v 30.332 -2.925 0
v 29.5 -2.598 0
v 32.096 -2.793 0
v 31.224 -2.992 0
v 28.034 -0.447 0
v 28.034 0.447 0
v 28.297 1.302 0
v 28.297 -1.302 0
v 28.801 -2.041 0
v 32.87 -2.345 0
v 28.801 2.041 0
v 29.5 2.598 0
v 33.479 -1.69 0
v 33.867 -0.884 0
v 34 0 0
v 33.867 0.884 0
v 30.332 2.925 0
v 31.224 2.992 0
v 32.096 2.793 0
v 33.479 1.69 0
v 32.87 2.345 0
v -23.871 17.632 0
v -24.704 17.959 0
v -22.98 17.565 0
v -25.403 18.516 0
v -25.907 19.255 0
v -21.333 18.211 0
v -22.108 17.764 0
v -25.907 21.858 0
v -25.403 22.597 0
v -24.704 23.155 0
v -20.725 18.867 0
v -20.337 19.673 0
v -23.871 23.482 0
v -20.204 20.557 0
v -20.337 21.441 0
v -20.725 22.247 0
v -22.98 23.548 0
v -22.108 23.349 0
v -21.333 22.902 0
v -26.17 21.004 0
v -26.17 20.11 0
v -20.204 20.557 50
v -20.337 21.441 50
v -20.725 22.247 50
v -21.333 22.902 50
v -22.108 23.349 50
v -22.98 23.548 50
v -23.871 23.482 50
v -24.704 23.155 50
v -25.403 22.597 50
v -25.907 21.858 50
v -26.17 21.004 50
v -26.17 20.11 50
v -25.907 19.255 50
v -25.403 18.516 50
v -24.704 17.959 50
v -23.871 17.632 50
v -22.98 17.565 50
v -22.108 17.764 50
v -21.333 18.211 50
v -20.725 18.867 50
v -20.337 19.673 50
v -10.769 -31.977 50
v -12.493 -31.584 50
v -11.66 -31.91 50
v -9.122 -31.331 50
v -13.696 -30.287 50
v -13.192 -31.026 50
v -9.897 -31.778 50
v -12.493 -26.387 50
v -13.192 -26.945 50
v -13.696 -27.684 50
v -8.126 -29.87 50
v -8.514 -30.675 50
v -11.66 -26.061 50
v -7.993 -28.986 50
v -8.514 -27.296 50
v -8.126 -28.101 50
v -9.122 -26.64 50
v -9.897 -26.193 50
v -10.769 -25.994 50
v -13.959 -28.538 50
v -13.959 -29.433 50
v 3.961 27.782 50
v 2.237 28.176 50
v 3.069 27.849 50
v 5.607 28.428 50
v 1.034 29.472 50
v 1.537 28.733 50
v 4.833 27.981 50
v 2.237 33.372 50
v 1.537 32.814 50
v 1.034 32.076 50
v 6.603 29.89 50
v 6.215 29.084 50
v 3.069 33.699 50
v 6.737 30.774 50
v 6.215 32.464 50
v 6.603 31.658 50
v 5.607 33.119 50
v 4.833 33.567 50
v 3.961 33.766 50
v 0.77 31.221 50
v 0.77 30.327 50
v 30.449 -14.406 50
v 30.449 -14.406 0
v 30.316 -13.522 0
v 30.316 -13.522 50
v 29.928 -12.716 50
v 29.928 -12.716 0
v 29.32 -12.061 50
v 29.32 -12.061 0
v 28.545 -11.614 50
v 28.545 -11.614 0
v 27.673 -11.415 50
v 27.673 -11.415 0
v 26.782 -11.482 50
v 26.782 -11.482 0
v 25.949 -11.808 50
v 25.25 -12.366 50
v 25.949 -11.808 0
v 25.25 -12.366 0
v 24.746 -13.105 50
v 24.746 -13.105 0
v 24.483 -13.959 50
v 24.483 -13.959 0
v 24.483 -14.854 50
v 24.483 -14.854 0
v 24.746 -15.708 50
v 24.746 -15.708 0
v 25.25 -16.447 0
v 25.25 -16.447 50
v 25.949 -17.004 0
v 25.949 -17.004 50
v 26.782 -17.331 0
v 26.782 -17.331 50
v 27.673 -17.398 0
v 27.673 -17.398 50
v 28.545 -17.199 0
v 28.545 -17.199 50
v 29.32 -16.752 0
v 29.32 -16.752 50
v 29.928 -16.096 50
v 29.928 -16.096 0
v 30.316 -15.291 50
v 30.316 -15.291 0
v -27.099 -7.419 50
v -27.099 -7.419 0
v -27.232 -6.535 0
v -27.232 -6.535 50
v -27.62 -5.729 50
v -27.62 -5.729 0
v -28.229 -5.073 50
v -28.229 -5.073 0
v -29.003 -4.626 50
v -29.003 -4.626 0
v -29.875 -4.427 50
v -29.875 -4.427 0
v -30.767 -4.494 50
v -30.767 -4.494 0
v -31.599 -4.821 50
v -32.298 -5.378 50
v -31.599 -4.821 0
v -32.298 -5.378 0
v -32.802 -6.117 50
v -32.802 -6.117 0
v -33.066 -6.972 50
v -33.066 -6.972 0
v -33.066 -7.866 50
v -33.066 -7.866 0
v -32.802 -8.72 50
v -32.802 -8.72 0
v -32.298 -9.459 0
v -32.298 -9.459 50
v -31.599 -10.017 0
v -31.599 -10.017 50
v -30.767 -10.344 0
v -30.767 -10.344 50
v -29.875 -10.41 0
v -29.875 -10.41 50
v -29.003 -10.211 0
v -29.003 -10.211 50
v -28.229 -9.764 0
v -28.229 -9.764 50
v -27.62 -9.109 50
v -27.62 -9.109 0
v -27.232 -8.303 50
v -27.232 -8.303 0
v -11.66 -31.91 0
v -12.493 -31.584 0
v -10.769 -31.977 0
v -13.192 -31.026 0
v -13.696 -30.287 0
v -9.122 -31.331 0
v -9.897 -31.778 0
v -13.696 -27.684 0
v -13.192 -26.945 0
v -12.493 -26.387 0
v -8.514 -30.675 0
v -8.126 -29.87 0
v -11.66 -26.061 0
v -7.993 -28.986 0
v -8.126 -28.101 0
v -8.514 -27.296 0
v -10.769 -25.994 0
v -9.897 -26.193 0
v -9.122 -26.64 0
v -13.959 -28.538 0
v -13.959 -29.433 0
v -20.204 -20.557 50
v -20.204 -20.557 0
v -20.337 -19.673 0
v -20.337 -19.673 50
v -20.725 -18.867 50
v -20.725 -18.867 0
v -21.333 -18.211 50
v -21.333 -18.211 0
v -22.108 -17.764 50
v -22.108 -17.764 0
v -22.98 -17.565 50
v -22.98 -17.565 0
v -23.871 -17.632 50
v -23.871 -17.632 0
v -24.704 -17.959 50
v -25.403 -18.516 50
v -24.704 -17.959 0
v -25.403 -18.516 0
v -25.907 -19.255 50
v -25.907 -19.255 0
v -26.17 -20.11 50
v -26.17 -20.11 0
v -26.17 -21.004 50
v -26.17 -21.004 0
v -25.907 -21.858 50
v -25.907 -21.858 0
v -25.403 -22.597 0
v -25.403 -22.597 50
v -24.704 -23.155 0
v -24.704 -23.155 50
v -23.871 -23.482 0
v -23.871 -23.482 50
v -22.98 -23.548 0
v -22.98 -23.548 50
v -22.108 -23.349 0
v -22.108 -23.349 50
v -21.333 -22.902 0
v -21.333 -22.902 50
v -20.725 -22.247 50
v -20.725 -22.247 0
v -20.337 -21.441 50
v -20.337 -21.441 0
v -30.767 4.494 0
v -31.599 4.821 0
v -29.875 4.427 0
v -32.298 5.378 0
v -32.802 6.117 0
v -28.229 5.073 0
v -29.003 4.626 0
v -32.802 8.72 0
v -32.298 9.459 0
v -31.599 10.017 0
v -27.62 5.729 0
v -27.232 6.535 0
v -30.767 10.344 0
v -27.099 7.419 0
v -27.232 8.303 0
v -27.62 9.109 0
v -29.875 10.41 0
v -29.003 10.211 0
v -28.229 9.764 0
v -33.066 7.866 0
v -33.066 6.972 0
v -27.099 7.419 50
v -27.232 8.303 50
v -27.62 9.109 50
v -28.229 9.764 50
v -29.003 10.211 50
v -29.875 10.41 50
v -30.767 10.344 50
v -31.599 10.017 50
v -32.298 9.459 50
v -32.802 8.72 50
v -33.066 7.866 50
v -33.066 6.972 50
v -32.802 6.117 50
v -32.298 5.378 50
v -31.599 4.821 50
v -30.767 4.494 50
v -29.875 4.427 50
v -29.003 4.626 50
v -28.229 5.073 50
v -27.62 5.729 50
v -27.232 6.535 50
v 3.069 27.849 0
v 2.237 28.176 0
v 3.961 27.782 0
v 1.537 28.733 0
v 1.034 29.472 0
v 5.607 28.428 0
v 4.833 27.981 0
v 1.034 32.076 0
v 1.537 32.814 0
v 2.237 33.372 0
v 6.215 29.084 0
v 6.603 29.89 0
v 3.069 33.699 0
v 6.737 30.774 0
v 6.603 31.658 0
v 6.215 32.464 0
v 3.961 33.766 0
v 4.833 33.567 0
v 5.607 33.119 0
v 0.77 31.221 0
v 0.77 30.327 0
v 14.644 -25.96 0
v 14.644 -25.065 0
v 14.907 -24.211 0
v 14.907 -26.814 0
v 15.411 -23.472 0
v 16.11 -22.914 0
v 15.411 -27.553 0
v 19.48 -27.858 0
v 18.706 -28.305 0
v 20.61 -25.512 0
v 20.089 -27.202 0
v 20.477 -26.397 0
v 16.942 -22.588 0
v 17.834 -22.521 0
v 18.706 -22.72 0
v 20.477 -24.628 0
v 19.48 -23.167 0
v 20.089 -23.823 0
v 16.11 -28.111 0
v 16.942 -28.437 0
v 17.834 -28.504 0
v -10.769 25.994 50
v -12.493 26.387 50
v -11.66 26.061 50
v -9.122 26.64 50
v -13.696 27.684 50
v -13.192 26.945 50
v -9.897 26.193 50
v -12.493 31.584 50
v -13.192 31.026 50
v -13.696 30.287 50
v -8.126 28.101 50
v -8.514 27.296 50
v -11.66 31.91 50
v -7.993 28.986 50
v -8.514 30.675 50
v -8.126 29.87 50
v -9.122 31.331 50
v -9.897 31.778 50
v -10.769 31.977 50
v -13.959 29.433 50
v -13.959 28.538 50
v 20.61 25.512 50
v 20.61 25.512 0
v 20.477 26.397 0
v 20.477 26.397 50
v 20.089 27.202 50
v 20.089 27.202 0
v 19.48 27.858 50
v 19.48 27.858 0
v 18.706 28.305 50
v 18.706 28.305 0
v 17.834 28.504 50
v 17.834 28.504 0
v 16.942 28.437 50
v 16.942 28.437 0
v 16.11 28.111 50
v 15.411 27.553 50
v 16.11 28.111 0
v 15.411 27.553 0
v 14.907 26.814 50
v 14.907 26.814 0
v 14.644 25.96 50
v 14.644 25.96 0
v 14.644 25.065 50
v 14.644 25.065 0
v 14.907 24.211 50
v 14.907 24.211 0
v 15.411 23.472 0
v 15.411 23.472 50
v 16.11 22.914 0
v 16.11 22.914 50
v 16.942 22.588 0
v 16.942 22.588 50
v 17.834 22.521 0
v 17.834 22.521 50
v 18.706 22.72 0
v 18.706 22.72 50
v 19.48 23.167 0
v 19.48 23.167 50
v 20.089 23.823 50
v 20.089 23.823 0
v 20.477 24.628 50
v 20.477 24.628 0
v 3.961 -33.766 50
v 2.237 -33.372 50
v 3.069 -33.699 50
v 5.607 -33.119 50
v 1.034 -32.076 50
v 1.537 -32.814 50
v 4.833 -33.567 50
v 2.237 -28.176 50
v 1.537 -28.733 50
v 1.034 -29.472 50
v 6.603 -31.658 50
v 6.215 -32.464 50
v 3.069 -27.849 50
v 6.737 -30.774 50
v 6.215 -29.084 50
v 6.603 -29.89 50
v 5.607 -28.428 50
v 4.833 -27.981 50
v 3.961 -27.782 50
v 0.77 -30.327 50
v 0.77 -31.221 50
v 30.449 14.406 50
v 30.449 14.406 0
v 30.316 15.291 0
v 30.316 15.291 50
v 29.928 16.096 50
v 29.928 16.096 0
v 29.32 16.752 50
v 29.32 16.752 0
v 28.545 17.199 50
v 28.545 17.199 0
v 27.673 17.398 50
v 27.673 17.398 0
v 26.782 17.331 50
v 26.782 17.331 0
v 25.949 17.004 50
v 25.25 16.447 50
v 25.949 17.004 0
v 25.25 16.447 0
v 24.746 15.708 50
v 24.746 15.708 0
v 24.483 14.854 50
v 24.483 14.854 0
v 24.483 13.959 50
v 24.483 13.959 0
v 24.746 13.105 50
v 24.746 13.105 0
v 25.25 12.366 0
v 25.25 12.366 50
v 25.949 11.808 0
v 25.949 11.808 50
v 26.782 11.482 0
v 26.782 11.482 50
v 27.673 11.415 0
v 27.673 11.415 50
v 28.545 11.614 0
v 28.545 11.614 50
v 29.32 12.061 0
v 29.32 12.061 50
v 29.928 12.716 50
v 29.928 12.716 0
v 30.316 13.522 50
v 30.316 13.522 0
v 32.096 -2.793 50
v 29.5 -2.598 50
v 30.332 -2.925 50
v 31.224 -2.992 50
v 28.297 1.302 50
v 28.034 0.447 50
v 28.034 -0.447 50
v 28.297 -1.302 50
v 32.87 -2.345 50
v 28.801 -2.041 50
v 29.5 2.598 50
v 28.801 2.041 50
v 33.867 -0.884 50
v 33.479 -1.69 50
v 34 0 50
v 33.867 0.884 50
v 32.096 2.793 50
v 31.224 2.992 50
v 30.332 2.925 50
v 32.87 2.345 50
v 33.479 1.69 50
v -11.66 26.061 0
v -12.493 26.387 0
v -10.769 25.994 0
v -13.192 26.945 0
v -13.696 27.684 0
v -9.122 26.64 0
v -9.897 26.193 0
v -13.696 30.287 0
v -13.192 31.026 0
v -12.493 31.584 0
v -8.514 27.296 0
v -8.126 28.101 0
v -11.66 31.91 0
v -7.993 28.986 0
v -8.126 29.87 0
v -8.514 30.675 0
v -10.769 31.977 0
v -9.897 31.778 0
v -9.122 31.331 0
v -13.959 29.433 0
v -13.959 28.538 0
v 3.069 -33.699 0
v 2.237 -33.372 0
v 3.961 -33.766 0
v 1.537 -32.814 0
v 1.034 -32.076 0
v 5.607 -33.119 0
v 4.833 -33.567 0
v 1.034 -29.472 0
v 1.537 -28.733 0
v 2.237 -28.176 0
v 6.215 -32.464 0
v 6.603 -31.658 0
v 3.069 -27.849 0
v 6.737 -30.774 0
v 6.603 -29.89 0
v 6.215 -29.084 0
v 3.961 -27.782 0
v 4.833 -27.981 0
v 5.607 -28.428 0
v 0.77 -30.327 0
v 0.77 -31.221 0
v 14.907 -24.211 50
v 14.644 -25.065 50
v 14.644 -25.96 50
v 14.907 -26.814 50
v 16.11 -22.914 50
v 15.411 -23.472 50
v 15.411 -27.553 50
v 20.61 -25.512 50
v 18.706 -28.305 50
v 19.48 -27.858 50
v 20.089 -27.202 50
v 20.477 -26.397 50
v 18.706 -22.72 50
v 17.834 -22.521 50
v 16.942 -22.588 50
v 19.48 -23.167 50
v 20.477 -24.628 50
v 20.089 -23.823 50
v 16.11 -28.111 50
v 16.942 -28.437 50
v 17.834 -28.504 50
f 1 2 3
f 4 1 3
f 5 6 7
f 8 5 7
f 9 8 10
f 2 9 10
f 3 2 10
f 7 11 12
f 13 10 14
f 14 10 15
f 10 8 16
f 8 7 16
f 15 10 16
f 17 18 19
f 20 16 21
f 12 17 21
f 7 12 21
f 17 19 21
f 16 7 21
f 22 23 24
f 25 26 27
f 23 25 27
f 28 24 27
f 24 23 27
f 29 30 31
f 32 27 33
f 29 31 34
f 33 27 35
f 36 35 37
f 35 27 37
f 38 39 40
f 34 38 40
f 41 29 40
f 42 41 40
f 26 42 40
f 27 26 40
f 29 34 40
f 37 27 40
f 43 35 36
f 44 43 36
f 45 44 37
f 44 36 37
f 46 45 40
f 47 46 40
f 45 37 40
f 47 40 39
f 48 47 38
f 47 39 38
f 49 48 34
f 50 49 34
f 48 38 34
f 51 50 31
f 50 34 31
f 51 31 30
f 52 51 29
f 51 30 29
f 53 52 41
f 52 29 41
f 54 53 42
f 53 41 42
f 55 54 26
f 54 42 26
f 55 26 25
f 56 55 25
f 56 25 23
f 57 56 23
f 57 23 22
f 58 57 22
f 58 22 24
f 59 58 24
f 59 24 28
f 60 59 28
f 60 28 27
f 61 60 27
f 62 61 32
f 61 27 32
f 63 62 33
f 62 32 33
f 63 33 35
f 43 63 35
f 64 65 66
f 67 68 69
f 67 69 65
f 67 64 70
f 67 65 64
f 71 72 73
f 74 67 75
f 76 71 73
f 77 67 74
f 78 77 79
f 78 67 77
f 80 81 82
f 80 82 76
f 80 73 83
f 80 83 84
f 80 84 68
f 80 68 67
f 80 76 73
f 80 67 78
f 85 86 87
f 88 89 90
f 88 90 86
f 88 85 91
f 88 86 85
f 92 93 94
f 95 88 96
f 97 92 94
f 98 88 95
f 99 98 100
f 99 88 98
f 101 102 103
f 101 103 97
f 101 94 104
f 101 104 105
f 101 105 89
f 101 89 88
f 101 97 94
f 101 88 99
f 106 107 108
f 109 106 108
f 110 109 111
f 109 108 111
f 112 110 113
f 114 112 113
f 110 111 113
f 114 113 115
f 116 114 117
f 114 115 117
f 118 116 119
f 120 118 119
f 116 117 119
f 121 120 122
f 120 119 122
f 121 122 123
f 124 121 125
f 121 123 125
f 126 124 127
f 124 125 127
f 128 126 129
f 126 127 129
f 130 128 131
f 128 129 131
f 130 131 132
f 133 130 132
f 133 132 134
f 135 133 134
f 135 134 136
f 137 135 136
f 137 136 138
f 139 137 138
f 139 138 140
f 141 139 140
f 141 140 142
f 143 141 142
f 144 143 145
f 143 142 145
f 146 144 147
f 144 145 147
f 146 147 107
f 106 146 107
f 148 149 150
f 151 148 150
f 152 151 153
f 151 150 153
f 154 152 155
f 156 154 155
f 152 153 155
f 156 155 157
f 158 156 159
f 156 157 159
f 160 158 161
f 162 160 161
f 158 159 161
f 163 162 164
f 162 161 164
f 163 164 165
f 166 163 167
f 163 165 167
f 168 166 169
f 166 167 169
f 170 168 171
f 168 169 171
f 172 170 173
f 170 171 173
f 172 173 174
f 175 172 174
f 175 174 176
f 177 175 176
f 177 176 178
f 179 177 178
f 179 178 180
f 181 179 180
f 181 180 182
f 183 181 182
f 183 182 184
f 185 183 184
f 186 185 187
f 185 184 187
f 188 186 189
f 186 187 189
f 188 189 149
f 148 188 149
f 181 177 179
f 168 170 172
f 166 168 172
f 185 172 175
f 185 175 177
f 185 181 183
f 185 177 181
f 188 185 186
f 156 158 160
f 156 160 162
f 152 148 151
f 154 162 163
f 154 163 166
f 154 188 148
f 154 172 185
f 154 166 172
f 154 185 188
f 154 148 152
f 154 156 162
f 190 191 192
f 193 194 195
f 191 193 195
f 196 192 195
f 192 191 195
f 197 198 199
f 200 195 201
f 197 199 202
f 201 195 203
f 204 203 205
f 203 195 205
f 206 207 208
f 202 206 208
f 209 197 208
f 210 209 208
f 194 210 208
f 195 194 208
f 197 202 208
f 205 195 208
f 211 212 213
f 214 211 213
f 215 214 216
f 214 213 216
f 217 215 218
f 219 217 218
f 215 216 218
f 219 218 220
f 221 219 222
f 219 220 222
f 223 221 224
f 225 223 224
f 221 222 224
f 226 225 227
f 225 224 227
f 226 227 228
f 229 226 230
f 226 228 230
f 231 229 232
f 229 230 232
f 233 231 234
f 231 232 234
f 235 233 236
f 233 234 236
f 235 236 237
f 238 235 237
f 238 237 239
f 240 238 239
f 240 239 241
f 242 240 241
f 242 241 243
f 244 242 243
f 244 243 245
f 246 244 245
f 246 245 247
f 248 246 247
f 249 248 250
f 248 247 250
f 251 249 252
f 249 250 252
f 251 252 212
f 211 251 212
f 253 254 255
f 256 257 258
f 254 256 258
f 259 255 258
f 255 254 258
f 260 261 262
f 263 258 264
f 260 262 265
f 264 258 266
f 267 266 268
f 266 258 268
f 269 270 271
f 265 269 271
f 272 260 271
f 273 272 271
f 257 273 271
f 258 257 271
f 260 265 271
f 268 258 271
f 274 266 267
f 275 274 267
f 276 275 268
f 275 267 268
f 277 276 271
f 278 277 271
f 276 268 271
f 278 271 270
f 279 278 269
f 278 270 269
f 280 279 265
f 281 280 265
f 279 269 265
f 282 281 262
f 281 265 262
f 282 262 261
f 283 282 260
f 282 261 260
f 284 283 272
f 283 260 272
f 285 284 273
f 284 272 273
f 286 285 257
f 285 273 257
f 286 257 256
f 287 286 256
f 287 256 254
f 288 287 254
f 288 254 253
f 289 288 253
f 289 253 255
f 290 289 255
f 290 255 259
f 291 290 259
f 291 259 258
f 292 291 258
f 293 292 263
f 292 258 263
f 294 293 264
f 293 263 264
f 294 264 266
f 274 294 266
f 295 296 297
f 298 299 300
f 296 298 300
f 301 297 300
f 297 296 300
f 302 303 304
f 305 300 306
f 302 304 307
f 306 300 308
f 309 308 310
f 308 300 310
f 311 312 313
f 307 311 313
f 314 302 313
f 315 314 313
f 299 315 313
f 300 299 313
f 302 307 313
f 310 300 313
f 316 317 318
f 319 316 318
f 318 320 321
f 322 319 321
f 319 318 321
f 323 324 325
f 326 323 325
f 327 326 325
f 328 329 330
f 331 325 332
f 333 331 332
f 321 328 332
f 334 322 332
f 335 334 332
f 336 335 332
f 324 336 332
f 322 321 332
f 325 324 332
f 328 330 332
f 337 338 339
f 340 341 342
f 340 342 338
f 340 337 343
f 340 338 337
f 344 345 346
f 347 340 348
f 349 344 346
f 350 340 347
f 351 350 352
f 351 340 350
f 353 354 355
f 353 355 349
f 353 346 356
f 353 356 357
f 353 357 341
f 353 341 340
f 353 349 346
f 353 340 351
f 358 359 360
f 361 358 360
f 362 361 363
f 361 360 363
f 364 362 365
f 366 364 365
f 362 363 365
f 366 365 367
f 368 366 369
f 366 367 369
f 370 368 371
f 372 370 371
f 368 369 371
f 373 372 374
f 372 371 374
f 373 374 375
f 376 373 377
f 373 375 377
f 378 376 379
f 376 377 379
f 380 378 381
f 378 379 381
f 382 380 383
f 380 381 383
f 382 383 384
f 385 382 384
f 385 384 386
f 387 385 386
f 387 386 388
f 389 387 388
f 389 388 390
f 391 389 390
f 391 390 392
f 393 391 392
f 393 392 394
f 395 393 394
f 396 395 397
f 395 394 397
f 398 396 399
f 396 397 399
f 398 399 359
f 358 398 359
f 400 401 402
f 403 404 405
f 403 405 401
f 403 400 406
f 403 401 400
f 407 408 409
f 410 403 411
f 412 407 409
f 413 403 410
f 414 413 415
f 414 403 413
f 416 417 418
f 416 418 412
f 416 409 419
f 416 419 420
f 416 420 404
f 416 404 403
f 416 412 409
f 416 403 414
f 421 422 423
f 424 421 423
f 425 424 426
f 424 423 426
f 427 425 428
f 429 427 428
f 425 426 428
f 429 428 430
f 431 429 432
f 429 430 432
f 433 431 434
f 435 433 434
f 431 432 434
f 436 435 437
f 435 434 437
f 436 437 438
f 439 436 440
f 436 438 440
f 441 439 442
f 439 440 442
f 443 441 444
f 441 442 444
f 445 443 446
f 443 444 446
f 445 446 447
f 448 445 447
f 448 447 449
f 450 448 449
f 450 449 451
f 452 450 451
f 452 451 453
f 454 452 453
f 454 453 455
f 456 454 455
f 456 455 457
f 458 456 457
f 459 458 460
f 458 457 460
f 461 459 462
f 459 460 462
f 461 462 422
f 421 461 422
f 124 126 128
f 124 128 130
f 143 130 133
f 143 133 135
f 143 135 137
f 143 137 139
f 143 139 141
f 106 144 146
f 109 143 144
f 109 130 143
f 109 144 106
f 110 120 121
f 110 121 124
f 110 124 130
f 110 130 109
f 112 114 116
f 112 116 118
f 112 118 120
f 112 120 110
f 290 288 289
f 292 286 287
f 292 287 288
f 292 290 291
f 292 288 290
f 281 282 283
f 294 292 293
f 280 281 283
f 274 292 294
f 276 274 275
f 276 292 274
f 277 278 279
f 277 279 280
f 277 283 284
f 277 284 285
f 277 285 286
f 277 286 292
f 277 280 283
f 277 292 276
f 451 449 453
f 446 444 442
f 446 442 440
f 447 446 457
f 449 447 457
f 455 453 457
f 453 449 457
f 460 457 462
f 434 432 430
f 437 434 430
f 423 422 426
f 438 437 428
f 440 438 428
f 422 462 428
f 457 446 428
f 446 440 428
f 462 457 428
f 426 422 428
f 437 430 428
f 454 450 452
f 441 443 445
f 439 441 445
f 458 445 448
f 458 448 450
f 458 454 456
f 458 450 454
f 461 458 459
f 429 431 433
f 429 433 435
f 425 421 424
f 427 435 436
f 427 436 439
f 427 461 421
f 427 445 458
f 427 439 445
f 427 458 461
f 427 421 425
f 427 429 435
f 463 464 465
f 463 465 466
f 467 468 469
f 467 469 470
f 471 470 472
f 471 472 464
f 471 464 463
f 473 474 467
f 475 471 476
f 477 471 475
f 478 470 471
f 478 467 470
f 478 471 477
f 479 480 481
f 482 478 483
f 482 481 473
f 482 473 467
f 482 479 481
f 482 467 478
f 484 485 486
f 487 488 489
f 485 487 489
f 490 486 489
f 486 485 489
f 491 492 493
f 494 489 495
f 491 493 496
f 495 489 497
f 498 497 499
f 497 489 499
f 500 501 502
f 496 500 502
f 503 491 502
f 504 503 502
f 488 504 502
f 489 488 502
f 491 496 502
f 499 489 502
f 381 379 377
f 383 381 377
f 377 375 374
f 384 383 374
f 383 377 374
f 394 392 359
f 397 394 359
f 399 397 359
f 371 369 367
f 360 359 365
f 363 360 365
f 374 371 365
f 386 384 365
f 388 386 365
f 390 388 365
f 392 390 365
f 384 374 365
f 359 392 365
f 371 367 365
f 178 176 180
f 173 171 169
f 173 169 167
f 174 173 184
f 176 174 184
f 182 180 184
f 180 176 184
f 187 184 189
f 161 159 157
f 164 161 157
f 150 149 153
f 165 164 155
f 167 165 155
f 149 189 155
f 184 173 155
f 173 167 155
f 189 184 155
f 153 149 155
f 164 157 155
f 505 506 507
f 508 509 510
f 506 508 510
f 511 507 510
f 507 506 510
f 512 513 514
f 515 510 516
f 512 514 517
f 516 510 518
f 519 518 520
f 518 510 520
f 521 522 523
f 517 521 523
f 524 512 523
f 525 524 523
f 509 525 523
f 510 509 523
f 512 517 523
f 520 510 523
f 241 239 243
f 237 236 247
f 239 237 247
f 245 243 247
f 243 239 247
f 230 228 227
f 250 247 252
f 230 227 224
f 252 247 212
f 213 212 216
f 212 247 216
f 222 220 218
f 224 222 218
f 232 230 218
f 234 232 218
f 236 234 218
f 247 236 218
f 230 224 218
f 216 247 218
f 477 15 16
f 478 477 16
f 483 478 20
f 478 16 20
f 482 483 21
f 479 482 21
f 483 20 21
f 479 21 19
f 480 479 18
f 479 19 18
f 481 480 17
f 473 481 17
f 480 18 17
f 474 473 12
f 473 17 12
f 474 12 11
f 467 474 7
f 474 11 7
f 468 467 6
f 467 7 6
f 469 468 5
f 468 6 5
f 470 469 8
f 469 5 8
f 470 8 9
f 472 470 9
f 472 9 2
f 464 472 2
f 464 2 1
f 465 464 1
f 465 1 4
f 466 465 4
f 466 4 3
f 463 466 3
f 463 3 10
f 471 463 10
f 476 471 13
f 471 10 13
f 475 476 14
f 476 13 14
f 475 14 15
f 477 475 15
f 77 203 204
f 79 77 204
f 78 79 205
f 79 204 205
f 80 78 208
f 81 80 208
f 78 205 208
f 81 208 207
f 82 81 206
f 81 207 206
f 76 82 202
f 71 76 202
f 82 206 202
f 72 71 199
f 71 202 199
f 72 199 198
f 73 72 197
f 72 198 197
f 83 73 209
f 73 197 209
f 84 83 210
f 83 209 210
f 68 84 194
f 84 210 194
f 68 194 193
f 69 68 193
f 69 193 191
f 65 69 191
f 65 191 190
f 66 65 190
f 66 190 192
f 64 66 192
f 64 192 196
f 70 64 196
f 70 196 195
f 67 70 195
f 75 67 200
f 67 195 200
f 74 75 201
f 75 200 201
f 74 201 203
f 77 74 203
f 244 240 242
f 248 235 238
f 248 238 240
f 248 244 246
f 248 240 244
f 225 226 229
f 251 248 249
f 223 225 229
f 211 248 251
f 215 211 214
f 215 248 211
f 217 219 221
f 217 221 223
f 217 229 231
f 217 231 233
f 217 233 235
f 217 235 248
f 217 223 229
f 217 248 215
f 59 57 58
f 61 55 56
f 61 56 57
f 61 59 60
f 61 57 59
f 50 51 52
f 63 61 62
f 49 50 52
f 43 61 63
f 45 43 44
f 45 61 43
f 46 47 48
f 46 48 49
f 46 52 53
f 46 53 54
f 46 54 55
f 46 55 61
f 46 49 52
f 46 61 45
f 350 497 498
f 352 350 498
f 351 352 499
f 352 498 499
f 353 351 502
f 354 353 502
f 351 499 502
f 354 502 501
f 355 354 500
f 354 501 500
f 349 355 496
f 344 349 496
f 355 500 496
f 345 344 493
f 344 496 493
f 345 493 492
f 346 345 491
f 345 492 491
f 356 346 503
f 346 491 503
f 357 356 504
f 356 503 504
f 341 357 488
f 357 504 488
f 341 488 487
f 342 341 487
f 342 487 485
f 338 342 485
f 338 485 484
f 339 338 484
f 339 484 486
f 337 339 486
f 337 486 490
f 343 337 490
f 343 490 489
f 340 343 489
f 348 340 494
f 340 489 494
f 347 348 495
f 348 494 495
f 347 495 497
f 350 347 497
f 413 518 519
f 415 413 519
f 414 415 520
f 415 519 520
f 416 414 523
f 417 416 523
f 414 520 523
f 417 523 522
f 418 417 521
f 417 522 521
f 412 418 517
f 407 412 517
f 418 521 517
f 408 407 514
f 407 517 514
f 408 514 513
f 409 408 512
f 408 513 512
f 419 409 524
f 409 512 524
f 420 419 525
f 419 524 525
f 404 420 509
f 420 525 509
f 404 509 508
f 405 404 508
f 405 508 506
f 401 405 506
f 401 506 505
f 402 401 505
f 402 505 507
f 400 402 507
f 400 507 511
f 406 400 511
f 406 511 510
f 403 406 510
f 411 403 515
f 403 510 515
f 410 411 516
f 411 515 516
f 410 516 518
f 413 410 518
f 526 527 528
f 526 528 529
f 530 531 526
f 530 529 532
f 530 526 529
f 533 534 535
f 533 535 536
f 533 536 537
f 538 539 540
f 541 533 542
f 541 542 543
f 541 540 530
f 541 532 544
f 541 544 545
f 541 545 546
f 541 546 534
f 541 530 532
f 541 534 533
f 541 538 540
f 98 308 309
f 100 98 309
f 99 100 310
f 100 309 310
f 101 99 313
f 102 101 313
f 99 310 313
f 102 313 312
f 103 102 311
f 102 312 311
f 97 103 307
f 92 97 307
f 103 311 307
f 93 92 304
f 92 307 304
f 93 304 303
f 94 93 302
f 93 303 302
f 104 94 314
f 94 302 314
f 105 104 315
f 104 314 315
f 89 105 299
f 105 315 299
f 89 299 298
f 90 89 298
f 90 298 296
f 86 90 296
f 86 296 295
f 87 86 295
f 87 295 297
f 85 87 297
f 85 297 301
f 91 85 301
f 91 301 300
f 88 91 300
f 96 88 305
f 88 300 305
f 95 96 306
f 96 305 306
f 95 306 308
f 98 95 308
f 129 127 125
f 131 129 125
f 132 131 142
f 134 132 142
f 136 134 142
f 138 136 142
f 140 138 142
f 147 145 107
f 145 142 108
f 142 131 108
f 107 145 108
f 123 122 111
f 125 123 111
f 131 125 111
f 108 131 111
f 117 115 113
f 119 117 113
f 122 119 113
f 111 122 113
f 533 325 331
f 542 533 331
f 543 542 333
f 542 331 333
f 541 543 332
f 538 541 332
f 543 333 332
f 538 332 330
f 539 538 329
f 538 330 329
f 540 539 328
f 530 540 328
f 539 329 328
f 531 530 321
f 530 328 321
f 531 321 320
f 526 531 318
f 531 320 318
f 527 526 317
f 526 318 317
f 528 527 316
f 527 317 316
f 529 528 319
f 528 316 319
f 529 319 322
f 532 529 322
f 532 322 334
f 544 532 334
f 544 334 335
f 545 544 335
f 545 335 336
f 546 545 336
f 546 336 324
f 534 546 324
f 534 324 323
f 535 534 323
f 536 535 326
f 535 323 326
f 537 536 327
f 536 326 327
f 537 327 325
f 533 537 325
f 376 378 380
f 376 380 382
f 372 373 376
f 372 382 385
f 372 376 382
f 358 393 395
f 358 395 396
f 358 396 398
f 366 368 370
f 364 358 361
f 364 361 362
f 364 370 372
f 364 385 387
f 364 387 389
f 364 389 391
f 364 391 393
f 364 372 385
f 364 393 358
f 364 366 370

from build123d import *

# Parameters (mm, degrees)
SKETCH1_R              = 3
BOSS_EXTRUDE1_DEPTH    = 50
BOSS_EXTRUDE1_2_DEPTH  = 50
BOSS_EXTRUDE1_3_DEPTH  = 50
BOSS_EXTRUDE1_4_DEPTH  = 50
BOSS_EXTRUDE1_5_DEPTH  = 50
BOSS_EXTRUDE1_6_DEPTH  = 50
BOSS_EXTRUDE1_7_DEPTH  = 50
BOSS_EXTRUDE1_8_DEPTH  = 50
BOSS_EXTRUDE1_9_DEPTH  = 50
BOSS_EXTRUDE1_10_DEPTH = 50
BOSS_EXTRUDE1_11_DEPTH = 50
BOSS_EXTRUDE1_12_DEPTH = 50
BOSS_EXTRUDE1_13_DEPTH = 50


with BuildPart() as part:
    # Sketch1 → Boss-Extrude1 (new body)
    with BuildSketch(Plane.XY):
        with Locations((31, 0)):
            Circle(SKETCH1_R)
    extrude(amount=BOSS_EXTRUDE1_DEPTH)


with BuildPart() as body_2:
    # Sketch1 → Boss-Extrude1 2 (new body)
    with BuildSketch(Plane.XY):
        with Locations((27.449136795, -14.406418333)):
            Circle(SKETCH1_R)
    extrude(amount=BOSS_EXTRUDE1_2_DEPTH)


with BuildPart() as body_3:
    # Sketch1 → Boss-Extrude1 3 (new body)
    with BuildSketch(Plane.XY):
        with Locations((17.610007149, -25.512499843)):
            Circle(SKETCH1_R)
    extrude(amount=BOSS_EXTRUDE1_3_DEPTH)


with BuildPart() as body_4:
    # Sketch1 → Boss-Extrude1 4 (new body)
    with BuildSketch(Plane.XY):
        with Locations((3.736637088, -30.773975097)):
            Circle(SKETCH1_R)
    extrude(amount=BOSS_EXTRUDE1_4_DEPTH)


with BuildPart() as body_5:
    # Sketch1 → Boss-Extrude1 5 (new body)
    with BuildSketch(Plane.XY):
        with Locations((-10.992751498, -28.985503523)):
            Circle(SKETCH1_R)
    extrude(amount=BOSS_EXTRUDE1_5_DEPTH)


with BuildPart() as body_6:
    # Sketch1 → Boss-Extrude1 6 (new body)
    with BuildSketch(Plane.XY):
        with Locations((-23.203833193, -20.556802405)):
            Circle(SKETCH1_R)
    extrude(amount=BOSS_EXTRUDE1_6_DEPTH)


with BuildPart() as body_7:
    # Sketch1 → Boss-Extrude1 7 (new body)
    with BuildSketch(Plane.XY):
        with Locations((-30.09919634, -7.418785593)):
            Circle(SKETCH1_R)
    extrude(amount=BOSS_EXTRUDE1_7_DEPTH)


with BuildPart() as body_8:
    # Sketch1 → Boss-Extrude1 8 (new body)
    with BuildSketch(Plane.XY):
        with Locations((-30.09919634, 7.418785593)):
            Circle(SKETCH1_R)
    extrude(amount=BOSS_EXTRUDE1_8_DEPTH)


with BuildPart() as body_9:
    # Sketch1 → Boss-Extrude1 9 (new body)
    with BuildSketch(Plane.XY):
        with Locations((-23.203833193, 20.556802405)):
            Circle(SKETCH1_R)
    extrude(amount=BOSS_EXTRUDE1_9_DEPTH)


with BuildPart() as body_10:
    # Sketch1 → Boss-Extrude1 10 (new body)
    with BuildSketch(Plane.XY):
        with Locations((-10.992751498, 28.985503523)):
            Circle(SKETCH1_R)
    extrude(amount=BOSS_EXTRUDE1_10_DEPTH)


with BuildPart() as body_11:
    # Sketch1 → Boss-Extrude1 11 (new body)
    with BuildSketch(Plane.XY):
        with Locations((3.736637088, 30.773975097)):
            Circle(SKETCH1_R)
    extrude(amount=BOSS_EXTRUDE1_11_DEPTH)


with BuildPart() as body_12:
    # Sketch1 → Boss-Extrude1 12 (new body)
    with BuildSketch(Plane.XY):
        with Locations((17.610007149, 25.512499843)):
            Circle(SKETCH1_R)
    extrude(amount=BOSS_EXTRUDE1_12_DEPTH)


with BuildPart() as body_13:
    # Sketch1 → Boss-Extrude1 13 (new body)
    with BuildSketch(Plane.XY):
        with Locations((27.449136795, 14.406418333)):
            Circle(SKETCH1_R)
    extrude(amount=BOSS_EXTRUDE1_13_DEPTH)


solid = Compound([part.part, body_2.part, body_3.part, body_4.part, body_5.part, body_6.part, body_7.part, body_8.part, body_9.part, body_10.part, body_11.part, body_12.part, body_13.part])
